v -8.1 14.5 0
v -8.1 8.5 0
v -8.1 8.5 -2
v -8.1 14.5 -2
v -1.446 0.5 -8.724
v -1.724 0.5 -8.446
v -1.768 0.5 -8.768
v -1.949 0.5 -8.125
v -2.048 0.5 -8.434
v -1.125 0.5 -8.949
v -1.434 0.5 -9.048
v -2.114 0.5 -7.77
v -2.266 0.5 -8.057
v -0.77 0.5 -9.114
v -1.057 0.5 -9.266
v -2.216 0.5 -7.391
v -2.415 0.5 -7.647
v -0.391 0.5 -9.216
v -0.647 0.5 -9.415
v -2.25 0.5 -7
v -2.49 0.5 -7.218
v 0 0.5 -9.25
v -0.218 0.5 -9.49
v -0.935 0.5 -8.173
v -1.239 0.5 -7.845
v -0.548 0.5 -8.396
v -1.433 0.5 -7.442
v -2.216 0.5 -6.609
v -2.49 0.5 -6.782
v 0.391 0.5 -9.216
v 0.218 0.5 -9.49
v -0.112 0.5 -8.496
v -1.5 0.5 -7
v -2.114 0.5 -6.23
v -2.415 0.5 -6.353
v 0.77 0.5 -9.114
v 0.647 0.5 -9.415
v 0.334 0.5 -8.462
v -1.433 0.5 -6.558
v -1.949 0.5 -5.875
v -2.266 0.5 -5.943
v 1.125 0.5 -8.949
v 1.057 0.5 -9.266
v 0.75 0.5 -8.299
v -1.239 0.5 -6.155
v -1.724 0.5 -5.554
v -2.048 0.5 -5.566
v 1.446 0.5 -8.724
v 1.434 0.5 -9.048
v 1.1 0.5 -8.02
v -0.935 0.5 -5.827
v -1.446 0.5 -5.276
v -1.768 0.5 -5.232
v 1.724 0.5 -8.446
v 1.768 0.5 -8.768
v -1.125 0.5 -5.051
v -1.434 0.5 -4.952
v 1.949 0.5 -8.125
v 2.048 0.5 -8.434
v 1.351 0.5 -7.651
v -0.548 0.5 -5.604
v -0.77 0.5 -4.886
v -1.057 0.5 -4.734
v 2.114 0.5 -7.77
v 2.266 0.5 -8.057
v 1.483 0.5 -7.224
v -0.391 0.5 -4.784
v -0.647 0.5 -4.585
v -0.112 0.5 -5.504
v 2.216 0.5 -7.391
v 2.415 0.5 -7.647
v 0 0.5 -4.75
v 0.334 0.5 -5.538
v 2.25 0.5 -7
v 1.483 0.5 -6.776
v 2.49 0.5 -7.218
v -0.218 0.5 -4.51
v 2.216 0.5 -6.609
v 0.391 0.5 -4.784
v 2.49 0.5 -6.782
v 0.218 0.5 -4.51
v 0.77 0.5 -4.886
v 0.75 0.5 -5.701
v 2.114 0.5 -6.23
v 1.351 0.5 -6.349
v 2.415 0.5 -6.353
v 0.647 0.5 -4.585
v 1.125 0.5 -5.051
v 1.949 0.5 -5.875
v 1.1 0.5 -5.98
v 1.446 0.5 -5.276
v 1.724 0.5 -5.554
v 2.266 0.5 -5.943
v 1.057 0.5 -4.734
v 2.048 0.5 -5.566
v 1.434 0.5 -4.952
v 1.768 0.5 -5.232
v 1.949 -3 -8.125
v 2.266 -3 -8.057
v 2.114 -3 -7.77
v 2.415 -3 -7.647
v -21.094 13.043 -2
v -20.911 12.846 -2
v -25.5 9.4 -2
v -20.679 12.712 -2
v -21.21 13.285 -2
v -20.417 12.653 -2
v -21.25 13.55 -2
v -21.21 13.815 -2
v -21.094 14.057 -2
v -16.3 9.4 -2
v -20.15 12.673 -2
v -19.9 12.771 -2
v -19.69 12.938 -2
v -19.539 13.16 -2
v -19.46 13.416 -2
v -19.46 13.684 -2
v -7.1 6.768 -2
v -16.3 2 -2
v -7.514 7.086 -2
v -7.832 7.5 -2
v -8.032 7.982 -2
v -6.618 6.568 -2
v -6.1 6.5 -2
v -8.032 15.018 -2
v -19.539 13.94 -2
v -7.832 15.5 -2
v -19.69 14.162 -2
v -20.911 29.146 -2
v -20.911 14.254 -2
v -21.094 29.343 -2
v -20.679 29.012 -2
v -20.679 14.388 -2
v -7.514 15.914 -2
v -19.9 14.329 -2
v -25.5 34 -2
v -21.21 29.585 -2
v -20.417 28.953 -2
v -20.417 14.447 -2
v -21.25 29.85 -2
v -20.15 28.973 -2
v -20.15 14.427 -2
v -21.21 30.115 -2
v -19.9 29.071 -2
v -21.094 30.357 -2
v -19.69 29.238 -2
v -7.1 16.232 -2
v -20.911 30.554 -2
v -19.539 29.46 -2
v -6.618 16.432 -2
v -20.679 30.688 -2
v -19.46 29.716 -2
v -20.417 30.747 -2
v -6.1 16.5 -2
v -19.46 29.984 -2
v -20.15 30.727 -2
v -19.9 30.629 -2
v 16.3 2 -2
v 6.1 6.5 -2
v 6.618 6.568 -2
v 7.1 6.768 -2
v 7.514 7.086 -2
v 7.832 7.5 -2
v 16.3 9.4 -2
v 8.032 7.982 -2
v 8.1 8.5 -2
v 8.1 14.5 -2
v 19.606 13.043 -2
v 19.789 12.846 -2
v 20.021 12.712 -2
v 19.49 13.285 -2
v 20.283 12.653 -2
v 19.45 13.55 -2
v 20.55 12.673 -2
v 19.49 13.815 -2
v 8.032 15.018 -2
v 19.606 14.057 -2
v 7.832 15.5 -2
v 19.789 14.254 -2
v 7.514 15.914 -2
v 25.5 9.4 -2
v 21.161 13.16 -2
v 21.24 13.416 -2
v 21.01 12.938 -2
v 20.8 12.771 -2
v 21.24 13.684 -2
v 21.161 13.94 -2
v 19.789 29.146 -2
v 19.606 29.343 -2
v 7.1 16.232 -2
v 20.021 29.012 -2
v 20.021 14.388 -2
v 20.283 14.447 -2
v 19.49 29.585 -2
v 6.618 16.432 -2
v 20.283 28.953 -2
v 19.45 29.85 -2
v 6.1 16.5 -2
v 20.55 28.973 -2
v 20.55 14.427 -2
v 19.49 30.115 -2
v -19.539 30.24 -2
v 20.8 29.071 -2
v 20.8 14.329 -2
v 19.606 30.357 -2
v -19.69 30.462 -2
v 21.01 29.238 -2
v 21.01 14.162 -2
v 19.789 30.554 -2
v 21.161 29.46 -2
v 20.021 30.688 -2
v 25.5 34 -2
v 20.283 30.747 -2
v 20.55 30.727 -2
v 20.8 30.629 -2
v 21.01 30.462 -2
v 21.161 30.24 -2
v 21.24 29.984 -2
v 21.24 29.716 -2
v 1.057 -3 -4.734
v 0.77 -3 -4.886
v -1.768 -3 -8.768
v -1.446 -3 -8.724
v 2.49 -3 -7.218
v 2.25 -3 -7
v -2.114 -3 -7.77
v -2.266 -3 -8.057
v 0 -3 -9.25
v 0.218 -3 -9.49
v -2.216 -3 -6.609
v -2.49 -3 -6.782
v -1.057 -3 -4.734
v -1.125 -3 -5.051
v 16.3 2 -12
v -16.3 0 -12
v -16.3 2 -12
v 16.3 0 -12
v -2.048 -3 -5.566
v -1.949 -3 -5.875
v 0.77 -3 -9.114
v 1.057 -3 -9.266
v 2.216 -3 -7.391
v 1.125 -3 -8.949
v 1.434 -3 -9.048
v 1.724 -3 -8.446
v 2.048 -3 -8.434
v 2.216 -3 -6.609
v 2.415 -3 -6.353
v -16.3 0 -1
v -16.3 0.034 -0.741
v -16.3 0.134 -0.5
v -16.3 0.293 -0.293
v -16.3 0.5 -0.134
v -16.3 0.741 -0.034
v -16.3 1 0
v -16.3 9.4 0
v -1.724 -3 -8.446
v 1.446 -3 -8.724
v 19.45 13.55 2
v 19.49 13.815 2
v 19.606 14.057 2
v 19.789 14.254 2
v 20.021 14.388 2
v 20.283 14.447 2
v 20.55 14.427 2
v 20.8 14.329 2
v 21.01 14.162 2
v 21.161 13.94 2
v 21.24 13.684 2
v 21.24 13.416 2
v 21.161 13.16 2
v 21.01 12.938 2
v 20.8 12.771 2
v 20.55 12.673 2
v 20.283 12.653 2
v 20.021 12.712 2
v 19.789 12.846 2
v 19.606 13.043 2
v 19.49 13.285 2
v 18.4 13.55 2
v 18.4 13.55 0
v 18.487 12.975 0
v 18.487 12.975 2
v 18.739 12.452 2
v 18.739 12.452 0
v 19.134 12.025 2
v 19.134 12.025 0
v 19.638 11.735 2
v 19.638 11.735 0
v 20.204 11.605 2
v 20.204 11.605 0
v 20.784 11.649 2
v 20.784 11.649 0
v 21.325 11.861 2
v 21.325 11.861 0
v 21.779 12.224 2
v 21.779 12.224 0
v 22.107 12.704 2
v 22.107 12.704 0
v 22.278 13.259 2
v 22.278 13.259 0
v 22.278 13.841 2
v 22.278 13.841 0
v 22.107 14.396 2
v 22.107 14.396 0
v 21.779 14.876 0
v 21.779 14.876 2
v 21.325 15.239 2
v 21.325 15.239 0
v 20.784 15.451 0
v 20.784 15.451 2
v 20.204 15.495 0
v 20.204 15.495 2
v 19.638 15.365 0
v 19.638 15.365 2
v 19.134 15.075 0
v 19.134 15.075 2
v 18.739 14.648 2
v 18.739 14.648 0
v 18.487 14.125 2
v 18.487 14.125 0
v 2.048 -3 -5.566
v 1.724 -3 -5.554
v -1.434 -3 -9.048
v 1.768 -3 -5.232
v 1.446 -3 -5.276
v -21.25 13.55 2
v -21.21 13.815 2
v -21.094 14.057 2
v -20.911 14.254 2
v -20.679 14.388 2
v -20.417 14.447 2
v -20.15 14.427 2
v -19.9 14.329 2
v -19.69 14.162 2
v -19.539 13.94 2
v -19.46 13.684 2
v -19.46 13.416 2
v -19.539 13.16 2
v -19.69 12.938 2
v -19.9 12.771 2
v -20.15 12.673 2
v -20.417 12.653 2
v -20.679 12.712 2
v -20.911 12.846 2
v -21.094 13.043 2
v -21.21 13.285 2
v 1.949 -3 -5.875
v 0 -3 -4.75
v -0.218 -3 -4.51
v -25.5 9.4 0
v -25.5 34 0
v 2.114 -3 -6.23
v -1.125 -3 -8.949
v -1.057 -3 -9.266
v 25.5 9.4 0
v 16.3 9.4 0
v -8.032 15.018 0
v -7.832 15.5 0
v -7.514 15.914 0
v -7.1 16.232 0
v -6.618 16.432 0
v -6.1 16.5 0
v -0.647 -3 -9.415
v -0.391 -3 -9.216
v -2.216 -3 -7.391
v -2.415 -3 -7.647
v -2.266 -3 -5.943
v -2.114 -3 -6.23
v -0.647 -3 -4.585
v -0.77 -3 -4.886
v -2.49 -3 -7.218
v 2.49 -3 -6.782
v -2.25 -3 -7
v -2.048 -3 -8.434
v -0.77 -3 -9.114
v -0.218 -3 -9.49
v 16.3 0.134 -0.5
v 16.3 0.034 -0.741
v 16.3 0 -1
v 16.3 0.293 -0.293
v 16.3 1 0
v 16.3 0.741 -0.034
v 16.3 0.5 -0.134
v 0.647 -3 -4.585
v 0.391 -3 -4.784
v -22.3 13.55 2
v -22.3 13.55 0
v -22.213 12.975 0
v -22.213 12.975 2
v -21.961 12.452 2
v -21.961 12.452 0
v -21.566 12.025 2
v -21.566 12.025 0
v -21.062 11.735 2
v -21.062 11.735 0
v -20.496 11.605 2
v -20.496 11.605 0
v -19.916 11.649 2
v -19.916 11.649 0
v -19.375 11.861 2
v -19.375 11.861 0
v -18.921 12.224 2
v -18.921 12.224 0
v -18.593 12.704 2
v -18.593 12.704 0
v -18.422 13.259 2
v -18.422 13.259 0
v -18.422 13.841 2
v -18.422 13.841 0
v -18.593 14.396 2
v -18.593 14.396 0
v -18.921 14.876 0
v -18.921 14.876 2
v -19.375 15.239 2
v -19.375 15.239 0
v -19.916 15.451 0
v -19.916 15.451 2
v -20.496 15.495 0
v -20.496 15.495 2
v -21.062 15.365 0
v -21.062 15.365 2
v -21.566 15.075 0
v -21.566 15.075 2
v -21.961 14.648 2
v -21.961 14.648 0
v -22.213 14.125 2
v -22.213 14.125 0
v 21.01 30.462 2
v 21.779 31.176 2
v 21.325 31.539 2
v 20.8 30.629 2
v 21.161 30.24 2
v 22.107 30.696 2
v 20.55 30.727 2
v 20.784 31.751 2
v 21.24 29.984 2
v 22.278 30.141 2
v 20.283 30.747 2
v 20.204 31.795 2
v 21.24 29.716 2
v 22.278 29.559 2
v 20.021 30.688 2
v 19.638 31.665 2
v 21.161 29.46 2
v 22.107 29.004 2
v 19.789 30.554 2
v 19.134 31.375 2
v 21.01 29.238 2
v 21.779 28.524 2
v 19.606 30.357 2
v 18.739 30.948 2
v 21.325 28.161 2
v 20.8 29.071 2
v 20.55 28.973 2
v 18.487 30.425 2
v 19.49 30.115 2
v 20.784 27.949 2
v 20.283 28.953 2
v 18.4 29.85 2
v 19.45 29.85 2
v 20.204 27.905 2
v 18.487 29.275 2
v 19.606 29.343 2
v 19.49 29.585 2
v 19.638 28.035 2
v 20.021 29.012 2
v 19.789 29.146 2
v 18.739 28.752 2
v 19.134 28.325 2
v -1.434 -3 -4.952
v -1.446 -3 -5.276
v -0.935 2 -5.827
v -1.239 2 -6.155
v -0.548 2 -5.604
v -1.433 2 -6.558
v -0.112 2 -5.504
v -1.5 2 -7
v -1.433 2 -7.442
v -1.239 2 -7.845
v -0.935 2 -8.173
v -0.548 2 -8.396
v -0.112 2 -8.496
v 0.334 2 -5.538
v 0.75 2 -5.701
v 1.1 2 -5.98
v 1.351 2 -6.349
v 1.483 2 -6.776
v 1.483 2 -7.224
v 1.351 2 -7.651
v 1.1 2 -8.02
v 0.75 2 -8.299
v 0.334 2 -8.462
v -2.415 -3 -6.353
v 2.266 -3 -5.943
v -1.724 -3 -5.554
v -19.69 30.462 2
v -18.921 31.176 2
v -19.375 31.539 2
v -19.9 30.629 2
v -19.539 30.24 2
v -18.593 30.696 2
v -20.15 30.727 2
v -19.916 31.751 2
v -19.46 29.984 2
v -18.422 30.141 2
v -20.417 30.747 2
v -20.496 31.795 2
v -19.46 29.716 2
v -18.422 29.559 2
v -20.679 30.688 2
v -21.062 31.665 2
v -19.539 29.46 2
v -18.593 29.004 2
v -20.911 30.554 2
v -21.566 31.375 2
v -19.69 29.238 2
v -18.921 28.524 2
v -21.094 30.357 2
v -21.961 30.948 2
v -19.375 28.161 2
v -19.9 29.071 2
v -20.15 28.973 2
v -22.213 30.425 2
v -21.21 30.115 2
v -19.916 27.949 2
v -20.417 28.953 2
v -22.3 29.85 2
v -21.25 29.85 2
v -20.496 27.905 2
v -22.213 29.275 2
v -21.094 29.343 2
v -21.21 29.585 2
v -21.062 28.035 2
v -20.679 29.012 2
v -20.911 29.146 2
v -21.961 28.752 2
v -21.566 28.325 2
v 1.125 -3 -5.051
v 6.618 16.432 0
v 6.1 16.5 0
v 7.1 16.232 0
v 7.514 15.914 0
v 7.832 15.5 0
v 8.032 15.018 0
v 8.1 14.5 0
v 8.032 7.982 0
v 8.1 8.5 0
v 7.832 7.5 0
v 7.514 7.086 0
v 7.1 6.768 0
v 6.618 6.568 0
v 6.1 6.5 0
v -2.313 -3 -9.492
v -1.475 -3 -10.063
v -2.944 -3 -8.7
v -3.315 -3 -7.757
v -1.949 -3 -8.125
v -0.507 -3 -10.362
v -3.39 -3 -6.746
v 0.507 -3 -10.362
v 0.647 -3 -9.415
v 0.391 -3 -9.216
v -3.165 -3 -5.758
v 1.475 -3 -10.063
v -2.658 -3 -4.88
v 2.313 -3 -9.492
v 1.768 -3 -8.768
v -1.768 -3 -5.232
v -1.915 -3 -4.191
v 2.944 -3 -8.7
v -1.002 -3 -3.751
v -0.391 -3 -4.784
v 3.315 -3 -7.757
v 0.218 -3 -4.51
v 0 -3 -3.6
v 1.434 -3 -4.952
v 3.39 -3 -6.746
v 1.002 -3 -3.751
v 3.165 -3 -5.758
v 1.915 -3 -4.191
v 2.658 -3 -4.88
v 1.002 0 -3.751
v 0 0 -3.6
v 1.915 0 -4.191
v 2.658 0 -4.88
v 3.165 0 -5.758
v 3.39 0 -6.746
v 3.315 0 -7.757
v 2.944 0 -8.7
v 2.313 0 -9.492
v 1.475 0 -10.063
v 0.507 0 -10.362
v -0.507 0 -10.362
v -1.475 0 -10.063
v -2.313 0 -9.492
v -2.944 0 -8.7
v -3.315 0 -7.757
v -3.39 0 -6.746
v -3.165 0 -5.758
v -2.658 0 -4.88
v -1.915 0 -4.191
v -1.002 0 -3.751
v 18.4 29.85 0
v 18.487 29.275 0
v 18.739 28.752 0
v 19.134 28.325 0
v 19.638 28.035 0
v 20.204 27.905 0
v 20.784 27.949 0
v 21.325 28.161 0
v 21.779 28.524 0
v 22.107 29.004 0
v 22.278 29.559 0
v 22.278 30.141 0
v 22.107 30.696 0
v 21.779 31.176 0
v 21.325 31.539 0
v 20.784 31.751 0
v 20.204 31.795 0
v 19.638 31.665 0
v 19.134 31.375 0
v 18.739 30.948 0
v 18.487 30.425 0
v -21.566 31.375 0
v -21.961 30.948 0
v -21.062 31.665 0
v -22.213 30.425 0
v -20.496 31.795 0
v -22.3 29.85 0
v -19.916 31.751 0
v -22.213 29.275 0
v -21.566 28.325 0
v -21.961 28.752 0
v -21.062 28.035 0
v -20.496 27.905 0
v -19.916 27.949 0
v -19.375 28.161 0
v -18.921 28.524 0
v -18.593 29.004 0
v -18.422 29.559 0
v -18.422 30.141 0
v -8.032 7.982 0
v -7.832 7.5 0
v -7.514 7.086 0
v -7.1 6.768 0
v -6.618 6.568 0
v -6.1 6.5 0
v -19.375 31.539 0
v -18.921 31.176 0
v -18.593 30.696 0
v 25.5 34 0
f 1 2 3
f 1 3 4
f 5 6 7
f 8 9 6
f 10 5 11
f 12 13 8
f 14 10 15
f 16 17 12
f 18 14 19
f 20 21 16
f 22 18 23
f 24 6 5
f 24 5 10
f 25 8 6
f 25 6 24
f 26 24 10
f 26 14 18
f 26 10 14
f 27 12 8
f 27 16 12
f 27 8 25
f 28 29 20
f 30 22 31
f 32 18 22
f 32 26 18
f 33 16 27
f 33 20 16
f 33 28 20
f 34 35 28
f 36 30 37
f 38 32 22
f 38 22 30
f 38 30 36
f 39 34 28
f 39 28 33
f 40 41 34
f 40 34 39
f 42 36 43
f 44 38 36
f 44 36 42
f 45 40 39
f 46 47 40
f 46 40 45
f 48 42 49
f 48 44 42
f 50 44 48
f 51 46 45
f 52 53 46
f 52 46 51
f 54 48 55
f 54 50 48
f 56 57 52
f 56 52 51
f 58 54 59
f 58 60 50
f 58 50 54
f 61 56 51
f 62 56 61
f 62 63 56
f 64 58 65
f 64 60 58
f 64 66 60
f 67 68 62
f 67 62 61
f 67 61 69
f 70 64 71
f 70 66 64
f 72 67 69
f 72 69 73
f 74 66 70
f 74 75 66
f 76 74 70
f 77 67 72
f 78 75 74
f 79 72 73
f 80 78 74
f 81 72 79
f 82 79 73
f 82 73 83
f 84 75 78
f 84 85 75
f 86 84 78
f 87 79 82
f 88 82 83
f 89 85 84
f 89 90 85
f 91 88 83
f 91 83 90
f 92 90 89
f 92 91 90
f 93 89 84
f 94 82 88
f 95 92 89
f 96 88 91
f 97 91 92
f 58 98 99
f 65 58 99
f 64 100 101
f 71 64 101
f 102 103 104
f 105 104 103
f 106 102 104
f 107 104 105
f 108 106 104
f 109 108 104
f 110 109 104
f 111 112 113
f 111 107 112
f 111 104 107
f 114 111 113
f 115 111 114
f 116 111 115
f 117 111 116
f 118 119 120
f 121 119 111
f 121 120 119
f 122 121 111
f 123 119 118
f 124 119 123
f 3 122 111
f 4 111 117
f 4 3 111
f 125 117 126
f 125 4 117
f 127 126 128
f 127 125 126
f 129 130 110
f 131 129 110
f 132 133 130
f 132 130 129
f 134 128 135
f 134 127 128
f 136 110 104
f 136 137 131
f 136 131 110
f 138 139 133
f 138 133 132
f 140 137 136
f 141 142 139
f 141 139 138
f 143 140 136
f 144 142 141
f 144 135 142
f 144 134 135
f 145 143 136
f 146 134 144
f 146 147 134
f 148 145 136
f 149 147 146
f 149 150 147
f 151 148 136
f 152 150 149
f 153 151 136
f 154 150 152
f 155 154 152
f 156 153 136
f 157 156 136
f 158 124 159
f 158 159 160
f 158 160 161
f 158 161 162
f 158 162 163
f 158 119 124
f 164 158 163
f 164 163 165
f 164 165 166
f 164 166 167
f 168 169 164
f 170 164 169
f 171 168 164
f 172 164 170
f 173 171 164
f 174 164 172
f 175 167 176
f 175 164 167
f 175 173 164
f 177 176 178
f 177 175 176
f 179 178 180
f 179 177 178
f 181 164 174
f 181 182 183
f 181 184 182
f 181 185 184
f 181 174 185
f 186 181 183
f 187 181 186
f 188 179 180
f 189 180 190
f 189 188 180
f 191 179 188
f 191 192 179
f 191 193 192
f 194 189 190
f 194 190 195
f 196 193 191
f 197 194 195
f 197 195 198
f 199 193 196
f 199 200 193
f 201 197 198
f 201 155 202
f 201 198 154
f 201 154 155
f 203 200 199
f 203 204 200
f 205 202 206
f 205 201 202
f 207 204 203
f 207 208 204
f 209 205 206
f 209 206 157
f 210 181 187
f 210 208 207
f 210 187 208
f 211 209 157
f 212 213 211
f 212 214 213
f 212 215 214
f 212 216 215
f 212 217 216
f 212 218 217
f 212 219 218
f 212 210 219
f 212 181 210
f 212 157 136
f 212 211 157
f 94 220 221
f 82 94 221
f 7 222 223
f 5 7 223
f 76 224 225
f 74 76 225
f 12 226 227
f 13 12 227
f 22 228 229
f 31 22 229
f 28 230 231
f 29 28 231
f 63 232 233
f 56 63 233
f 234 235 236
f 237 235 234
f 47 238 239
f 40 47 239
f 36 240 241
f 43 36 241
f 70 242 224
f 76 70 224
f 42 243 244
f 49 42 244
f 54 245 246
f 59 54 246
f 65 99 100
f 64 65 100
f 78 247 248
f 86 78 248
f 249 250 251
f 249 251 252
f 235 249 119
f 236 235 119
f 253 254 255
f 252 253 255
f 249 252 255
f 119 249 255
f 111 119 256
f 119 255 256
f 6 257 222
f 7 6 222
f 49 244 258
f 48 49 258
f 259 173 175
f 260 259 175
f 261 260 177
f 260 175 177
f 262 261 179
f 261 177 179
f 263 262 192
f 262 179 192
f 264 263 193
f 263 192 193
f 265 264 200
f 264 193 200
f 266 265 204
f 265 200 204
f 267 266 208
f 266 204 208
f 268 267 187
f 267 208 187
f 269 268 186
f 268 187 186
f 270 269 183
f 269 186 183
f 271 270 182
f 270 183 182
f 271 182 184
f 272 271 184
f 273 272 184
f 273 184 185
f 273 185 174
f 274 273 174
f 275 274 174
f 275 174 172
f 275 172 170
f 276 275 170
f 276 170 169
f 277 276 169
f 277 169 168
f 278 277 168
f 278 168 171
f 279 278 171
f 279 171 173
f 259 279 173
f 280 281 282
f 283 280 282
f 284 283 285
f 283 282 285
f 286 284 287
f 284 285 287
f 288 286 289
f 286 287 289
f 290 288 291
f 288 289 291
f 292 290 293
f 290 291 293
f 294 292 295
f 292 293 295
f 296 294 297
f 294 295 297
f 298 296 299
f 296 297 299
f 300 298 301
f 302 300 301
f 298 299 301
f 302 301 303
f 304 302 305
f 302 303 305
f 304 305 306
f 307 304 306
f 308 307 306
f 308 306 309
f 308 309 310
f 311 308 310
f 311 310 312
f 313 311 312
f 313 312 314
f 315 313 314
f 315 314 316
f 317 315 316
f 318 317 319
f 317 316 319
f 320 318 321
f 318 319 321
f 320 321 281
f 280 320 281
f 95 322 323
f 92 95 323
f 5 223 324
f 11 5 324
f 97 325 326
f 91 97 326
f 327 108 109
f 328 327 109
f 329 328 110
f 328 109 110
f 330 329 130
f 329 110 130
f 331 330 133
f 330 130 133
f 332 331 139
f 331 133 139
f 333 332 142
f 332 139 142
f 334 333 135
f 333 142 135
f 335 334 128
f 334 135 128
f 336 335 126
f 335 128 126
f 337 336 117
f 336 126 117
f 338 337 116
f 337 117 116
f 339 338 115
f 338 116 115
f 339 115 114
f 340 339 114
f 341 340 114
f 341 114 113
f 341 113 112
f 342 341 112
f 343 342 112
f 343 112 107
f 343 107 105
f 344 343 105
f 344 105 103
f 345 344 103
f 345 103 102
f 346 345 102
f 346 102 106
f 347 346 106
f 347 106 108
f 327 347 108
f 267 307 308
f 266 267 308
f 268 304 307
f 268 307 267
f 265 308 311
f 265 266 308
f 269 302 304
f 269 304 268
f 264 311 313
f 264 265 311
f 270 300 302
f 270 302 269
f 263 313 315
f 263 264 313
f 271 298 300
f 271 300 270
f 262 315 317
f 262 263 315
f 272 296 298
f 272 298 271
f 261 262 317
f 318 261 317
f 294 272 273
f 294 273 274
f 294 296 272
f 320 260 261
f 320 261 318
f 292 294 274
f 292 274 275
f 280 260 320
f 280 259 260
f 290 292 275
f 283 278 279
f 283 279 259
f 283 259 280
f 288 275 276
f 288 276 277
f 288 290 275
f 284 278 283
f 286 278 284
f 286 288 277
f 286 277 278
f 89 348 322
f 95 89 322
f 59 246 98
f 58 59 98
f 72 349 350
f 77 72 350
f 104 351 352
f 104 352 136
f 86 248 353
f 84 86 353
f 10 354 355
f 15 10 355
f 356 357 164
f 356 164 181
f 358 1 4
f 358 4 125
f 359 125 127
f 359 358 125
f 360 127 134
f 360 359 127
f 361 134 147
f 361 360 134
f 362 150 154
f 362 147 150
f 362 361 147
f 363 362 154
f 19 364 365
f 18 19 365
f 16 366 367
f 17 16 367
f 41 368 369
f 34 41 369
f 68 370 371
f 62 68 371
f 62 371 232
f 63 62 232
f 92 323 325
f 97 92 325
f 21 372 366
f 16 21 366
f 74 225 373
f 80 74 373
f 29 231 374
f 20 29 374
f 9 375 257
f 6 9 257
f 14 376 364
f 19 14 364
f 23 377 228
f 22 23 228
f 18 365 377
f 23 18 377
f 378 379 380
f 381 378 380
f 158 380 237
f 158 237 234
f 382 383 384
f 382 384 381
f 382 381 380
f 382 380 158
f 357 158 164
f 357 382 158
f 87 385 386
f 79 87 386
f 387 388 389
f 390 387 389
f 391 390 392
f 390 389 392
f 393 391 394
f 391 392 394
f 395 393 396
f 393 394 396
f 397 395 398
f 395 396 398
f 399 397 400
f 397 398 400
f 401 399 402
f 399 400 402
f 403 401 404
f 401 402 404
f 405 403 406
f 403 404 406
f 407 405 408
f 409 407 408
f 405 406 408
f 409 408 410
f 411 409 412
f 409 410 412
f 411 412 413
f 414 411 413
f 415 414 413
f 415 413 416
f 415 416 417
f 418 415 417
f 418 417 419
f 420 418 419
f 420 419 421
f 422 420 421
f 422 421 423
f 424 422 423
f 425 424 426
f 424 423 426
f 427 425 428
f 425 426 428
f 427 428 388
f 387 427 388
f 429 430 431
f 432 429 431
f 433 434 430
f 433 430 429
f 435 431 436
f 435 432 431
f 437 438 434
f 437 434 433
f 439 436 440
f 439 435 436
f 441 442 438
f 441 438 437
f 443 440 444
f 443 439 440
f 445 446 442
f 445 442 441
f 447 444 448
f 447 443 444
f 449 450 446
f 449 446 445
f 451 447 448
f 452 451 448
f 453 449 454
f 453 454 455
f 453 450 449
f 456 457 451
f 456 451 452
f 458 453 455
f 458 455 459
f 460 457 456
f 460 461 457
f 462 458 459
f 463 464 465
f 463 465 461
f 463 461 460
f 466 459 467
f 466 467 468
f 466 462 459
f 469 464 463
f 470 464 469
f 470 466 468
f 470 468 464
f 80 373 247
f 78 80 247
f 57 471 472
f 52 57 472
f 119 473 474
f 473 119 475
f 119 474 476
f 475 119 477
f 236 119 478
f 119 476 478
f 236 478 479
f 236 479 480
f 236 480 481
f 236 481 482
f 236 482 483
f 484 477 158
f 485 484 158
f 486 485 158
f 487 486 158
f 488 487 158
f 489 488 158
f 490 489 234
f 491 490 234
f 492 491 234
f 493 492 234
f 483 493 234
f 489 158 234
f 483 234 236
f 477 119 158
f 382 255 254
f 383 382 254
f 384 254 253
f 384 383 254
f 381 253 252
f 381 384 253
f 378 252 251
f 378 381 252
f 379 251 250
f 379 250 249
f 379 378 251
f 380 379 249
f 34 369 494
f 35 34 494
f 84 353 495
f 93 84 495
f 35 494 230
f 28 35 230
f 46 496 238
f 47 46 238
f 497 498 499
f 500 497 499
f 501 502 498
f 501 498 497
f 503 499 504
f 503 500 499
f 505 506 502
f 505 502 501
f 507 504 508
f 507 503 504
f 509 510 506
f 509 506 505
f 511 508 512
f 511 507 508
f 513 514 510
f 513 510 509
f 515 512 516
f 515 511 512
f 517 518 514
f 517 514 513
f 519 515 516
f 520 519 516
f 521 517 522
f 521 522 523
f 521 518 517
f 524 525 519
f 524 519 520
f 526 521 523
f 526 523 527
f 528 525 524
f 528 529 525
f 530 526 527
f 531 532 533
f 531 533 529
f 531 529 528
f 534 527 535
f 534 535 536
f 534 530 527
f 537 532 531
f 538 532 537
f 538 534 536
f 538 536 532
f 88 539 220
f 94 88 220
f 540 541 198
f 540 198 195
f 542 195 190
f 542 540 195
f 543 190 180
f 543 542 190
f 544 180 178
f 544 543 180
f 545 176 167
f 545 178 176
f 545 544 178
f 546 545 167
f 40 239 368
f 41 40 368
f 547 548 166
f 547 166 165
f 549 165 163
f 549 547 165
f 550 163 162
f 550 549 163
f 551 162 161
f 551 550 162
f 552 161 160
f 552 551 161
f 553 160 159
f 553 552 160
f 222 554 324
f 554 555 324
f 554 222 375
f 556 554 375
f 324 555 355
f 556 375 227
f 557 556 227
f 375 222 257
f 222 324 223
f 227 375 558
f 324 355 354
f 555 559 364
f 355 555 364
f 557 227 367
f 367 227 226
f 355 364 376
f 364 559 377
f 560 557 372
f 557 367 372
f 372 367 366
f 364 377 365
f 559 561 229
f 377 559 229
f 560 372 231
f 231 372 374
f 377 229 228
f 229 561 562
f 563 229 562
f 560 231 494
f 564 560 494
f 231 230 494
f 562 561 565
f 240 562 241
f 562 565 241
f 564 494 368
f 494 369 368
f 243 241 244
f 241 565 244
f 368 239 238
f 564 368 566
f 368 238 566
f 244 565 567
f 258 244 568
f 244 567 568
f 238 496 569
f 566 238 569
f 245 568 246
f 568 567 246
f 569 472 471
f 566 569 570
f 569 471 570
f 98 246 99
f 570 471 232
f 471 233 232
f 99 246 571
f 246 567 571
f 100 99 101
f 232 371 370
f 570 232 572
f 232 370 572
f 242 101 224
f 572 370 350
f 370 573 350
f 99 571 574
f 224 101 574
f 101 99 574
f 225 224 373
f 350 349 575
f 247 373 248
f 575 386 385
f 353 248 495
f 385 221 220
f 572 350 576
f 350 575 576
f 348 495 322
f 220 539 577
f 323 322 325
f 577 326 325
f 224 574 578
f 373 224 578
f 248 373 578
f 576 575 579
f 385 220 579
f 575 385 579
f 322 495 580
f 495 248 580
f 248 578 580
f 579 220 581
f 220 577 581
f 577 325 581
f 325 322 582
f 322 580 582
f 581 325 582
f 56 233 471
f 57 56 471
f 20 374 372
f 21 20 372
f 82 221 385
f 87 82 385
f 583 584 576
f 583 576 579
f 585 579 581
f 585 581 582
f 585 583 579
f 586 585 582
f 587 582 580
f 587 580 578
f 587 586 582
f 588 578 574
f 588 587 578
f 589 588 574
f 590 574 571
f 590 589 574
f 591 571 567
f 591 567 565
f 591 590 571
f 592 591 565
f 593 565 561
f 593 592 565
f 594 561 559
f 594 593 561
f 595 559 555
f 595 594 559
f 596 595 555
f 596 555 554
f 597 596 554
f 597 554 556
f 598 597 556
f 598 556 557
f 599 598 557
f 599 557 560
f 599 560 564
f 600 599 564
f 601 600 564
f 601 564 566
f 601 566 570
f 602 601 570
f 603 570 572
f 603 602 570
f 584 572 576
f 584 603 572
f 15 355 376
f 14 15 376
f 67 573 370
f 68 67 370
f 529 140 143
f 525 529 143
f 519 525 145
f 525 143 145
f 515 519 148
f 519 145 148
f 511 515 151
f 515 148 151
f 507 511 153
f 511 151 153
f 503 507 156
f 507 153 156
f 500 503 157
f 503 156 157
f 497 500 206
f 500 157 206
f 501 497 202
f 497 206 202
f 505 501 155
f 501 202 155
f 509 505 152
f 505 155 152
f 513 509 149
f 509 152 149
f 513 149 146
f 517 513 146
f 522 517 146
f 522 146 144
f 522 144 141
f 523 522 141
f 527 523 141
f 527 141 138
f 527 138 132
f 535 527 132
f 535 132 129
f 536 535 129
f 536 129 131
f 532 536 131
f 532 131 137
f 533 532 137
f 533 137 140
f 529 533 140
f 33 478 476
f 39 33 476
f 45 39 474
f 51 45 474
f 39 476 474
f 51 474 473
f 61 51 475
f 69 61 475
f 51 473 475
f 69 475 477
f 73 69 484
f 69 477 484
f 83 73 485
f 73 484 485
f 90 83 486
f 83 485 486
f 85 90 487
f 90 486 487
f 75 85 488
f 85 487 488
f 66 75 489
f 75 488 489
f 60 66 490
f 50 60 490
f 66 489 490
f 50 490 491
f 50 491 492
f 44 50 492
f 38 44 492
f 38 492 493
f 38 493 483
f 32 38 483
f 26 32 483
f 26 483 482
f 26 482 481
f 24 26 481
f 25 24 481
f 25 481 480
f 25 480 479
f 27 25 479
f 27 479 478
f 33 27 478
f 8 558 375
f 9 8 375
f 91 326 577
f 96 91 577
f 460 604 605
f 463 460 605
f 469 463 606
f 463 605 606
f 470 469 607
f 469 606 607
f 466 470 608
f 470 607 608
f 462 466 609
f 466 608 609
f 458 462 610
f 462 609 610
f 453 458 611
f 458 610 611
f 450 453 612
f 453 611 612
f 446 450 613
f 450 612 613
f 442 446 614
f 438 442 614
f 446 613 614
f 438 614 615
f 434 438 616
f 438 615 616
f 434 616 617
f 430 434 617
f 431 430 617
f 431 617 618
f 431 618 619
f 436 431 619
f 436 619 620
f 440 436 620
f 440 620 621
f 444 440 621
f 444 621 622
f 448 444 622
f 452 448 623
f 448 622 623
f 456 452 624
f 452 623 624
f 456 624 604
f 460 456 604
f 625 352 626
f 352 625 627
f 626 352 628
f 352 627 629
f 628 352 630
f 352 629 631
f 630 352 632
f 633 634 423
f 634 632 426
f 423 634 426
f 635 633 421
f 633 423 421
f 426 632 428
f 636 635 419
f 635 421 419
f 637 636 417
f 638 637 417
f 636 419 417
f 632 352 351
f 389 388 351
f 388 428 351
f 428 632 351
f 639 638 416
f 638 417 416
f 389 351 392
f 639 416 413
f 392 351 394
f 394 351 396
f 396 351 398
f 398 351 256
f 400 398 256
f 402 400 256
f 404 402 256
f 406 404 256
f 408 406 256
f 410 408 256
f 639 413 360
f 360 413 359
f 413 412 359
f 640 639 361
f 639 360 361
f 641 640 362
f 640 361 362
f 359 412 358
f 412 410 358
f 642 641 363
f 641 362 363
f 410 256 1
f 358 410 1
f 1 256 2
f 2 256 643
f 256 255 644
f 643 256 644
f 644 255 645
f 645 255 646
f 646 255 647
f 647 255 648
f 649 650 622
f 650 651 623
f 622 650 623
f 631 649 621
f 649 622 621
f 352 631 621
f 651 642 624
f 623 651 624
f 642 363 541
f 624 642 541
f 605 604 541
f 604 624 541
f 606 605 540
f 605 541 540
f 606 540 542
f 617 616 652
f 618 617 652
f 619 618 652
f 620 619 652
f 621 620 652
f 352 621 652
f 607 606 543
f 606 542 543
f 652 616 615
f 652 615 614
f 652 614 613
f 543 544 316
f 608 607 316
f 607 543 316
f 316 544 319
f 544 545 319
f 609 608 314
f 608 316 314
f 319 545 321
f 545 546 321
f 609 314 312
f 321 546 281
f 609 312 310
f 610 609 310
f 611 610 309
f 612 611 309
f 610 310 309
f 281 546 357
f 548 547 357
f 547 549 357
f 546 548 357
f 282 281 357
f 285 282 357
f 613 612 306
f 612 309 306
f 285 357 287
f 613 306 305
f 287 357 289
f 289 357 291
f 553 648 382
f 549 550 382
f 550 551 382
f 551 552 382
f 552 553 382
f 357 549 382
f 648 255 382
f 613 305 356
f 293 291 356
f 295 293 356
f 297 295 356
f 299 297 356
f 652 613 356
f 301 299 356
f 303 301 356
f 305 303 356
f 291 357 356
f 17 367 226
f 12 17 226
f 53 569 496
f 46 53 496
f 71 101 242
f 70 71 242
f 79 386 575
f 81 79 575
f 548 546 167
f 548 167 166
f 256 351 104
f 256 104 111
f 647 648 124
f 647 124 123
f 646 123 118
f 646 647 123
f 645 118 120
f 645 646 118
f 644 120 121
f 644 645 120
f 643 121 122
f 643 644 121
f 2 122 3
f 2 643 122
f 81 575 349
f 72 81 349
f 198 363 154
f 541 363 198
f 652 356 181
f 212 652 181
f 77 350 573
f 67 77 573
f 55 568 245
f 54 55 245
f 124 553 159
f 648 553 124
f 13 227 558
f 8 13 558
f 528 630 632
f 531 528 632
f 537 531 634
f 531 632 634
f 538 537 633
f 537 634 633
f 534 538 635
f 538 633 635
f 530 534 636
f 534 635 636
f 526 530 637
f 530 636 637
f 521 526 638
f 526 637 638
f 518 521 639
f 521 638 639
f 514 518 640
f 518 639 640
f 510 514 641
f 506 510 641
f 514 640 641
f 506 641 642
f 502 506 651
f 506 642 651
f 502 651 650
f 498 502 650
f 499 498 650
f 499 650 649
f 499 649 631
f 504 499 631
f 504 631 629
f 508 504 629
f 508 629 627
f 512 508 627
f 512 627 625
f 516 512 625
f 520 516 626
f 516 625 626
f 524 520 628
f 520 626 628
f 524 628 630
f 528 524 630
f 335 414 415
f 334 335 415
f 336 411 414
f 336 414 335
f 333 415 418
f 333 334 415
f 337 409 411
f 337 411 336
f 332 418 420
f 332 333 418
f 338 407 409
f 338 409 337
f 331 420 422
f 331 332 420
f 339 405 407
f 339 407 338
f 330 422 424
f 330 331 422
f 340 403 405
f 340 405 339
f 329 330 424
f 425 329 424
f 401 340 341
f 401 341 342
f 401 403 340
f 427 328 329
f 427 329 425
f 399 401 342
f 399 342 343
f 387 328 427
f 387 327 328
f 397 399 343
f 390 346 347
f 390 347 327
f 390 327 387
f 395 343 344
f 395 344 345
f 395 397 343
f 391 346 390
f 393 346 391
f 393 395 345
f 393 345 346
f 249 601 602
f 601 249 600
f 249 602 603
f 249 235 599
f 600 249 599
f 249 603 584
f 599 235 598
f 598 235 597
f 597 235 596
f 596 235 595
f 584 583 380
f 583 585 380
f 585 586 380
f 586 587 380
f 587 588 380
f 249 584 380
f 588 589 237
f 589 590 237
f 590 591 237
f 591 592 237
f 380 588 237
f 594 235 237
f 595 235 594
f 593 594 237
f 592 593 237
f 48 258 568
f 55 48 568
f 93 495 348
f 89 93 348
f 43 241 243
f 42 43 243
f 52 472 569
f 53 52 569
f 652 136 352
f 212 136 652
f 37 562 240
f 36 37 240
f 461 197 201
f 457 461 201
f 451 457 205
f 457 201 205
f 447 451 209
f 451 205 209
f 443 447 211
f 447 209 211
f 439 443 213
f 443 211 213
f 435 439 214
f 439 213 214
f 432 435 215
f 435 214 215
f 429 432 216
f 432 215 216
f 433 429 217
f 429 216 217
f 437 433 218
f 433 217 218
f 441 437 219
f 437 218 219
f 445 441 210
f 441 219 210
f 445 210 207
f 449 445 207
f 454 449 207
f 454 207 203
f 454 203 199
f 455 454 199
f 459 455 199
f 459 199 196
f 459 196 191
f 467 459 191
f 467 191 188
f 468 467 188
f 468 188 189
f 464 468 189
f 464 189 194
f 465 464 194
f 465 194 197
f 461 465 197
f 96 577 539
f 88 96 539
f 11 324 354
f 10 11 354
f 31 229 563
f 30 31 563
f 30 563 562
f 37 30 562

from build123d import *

# Parameters (mm, degrees)
SKETCH1_W               = 51
SKETCH1_H               = 12
BRACKET_SIZE_DEPTH      = 34
SKETCH2_W               = 10
SKETCH2_H               = 32
SIDE_PROFILE_DEPTH      = 45.161634934
SIDE_PROFILE_DEPTH_BACK = 45.161634934
FILLET1_R               = 1
SKETCH3_W               = 9.2
SKETCH3_H               = 9.4
BASE_TRIM_DEPTH         = 45.161634934
WIRE_REILEF_HOLE_DEPTH  = 45.161634934
SKETCH5_R               = 1.95
SPACER_DEPTH            = 2
M1_6_CLEARANCE_HOLE1_D  = 1.8
SKETCH8_R               = 3.4
SERVO_SPACER_DEPTH      = 3
SPLINE_TOOTH_DEPTH      = 3.5
SPLINE_COUNT            = 36
M2_CLEARANCE_HOLE1_D    = 3


with BuildPart() as part:
    # Sketch1 → Bracket Size (new body)
    with BuildSketch(Plane(origin=(0, 0, 0), x_dir=(1, 0, 0), z_dir=(0, 1, 0))):
        with Locations((0, 6)):
            Rectangle(SKETCH1_W, SKETCH1_H)
    extrude(amount=BRACKET_SIZE_DEPTH)

    # Sketch2 → Side Profile (cut, two sides)
    with BuildSketch(Plane(origin=(0, 0, 0), x_dir=(0, 0, -1), z_dir=(1, 0, 0))) as side_profile_sk:
        with Locations((7, 18)):
            Rectangle(SKETCH2_W, SKETCH2_H)
    extrude(amount=SIDE_PROFILE_DEPTH, mode=Mode.SUBTRACT)
    extrude(side_profile_sk.sketch, amount=-SIDE_PROFILE_DEPTH_BACK, mode=Mode.SUBTRACT)

    # Fillet1
    fillet1_edges = [part.edges().sort_by_distance(p)[0] for p in [
        (0, 0, 0),
    ]]
    fillet(fillet1_edges, radius=FILLET1_R)

    # Sketch3 → Base Trim (cut, through all)
    with BuildSketch(Plane.XY):
        with Locations((20.9, 4.7)):
            Rectangle(SKETCH3_W, SKETCH3_H)
        with Locations((-20.9, 4.7)):
            Rectangle(SKETCH3_W, SKETCH3_H)
    extrude(amount=-BASE_TRIM_DEPTH, mode=Mode.SUBTRACT)

    # Sketch4 → Wire Reilef Hole (cut, through all)
    with BuildSketch(Plane.XY):
        with BuildLine():
            Line((-6.1, 16.5), (6.1, 16.5))
            ThreePointArc((6.1, 16.5), (7.514213562, 15.914213562), (8.1, 14.5))
            Line((8.1, 14.5), (8.1, 8.5))
            ThreePointArc((8.1, 8.5), (7.514213562, 7.085786438), (6.1, 6.5))
            Line((6.1, 6.5), (-6.1, 6.5))
            ThreePointArc((-6.1, 6.5), (-7.514213562, 7.085786438), (-8.1, 8.5))
            Line((-8.1, 8.5), (-8.1, 14.5))
            ThreePointArc((-8.1, 14.5), (-7.514213562, 15.914213562), (-6.1, 16.5))
        make_face()
    extrude(amount=-WIRE_REILEF_HOLE_DEPTH, mode=Mode.SUBTRACT)

    # Sketch5 → Spacer (add)
    with BuildSketch(Plane.XY):
        with Locations(Location((-20.35, 29.85, 0), (0, 0, 180))):
            Circle(SKETCH5_R)
    spacer = extrude(amount=SPACER_DEPTH)

    # M1.6 Clearance Hole1 (through all)
    with Locations(Plane.XY.offset(2)):
        with Locations((-20.35, 29.85)):
            m1_6_clearance_hole1 = Hole(M1_6_CLEARANCE_HOLE1_D / 2)

    # Spacer Pattern: Spacer, M1.6 Clearance Hole1 at 3 more places
    with Locations((0, -16.3, 0), (40.7, -16.3, 0), (40.7, 0, 0)):
        add(spacer)
        add(m1_6_clearance_hole1, mode=Mode.SUBTRACT)

    # Sketch8 → Servo Spacer (add)
    with BuildSketch(Plane(origin=(0, 0, 0), x_dir=(1, 0, 0), z_dir=(0, 1, 0))):
        with Locations(Location((0, 7, 0), (0, 0, 270))):
            Circle(SKETCH8_R)
    extrude(amount=-SERVO_SPACER_DEPTH)

    # Sketch9 → Spline Tooth (cut)
    with BuildSketch(Plane.XZ.offset(3)):
        Polygon((0.39070839, -4.78418261), (0.217889353, -4.509513302), (0, -4.750000055), (0, -7), align=None)
    spline_tooth = extrude(amount=-SPLINE_TOOTH_DEPTH, mode=Mode.SUBTRACT)

    # Spline: Spline Tooth ×36 about axis
    spline_axis = Axis((0, 0, -7), (0, 1, 0))
    for i in range(1, SPLINE_COUNT):
        add(spline_tooth.rotate(spline_axis, i * 360 / SPLINE_COUNT), mode=Mode.SUBTRACT)

    # M2 Clearance Hole1 (through all)
    with Locations(Plane.XZ):
        with Locations((0, -7)):
            Hole(M2_CLEARANCE_HOLE1_D / 2)


solid = part.part
